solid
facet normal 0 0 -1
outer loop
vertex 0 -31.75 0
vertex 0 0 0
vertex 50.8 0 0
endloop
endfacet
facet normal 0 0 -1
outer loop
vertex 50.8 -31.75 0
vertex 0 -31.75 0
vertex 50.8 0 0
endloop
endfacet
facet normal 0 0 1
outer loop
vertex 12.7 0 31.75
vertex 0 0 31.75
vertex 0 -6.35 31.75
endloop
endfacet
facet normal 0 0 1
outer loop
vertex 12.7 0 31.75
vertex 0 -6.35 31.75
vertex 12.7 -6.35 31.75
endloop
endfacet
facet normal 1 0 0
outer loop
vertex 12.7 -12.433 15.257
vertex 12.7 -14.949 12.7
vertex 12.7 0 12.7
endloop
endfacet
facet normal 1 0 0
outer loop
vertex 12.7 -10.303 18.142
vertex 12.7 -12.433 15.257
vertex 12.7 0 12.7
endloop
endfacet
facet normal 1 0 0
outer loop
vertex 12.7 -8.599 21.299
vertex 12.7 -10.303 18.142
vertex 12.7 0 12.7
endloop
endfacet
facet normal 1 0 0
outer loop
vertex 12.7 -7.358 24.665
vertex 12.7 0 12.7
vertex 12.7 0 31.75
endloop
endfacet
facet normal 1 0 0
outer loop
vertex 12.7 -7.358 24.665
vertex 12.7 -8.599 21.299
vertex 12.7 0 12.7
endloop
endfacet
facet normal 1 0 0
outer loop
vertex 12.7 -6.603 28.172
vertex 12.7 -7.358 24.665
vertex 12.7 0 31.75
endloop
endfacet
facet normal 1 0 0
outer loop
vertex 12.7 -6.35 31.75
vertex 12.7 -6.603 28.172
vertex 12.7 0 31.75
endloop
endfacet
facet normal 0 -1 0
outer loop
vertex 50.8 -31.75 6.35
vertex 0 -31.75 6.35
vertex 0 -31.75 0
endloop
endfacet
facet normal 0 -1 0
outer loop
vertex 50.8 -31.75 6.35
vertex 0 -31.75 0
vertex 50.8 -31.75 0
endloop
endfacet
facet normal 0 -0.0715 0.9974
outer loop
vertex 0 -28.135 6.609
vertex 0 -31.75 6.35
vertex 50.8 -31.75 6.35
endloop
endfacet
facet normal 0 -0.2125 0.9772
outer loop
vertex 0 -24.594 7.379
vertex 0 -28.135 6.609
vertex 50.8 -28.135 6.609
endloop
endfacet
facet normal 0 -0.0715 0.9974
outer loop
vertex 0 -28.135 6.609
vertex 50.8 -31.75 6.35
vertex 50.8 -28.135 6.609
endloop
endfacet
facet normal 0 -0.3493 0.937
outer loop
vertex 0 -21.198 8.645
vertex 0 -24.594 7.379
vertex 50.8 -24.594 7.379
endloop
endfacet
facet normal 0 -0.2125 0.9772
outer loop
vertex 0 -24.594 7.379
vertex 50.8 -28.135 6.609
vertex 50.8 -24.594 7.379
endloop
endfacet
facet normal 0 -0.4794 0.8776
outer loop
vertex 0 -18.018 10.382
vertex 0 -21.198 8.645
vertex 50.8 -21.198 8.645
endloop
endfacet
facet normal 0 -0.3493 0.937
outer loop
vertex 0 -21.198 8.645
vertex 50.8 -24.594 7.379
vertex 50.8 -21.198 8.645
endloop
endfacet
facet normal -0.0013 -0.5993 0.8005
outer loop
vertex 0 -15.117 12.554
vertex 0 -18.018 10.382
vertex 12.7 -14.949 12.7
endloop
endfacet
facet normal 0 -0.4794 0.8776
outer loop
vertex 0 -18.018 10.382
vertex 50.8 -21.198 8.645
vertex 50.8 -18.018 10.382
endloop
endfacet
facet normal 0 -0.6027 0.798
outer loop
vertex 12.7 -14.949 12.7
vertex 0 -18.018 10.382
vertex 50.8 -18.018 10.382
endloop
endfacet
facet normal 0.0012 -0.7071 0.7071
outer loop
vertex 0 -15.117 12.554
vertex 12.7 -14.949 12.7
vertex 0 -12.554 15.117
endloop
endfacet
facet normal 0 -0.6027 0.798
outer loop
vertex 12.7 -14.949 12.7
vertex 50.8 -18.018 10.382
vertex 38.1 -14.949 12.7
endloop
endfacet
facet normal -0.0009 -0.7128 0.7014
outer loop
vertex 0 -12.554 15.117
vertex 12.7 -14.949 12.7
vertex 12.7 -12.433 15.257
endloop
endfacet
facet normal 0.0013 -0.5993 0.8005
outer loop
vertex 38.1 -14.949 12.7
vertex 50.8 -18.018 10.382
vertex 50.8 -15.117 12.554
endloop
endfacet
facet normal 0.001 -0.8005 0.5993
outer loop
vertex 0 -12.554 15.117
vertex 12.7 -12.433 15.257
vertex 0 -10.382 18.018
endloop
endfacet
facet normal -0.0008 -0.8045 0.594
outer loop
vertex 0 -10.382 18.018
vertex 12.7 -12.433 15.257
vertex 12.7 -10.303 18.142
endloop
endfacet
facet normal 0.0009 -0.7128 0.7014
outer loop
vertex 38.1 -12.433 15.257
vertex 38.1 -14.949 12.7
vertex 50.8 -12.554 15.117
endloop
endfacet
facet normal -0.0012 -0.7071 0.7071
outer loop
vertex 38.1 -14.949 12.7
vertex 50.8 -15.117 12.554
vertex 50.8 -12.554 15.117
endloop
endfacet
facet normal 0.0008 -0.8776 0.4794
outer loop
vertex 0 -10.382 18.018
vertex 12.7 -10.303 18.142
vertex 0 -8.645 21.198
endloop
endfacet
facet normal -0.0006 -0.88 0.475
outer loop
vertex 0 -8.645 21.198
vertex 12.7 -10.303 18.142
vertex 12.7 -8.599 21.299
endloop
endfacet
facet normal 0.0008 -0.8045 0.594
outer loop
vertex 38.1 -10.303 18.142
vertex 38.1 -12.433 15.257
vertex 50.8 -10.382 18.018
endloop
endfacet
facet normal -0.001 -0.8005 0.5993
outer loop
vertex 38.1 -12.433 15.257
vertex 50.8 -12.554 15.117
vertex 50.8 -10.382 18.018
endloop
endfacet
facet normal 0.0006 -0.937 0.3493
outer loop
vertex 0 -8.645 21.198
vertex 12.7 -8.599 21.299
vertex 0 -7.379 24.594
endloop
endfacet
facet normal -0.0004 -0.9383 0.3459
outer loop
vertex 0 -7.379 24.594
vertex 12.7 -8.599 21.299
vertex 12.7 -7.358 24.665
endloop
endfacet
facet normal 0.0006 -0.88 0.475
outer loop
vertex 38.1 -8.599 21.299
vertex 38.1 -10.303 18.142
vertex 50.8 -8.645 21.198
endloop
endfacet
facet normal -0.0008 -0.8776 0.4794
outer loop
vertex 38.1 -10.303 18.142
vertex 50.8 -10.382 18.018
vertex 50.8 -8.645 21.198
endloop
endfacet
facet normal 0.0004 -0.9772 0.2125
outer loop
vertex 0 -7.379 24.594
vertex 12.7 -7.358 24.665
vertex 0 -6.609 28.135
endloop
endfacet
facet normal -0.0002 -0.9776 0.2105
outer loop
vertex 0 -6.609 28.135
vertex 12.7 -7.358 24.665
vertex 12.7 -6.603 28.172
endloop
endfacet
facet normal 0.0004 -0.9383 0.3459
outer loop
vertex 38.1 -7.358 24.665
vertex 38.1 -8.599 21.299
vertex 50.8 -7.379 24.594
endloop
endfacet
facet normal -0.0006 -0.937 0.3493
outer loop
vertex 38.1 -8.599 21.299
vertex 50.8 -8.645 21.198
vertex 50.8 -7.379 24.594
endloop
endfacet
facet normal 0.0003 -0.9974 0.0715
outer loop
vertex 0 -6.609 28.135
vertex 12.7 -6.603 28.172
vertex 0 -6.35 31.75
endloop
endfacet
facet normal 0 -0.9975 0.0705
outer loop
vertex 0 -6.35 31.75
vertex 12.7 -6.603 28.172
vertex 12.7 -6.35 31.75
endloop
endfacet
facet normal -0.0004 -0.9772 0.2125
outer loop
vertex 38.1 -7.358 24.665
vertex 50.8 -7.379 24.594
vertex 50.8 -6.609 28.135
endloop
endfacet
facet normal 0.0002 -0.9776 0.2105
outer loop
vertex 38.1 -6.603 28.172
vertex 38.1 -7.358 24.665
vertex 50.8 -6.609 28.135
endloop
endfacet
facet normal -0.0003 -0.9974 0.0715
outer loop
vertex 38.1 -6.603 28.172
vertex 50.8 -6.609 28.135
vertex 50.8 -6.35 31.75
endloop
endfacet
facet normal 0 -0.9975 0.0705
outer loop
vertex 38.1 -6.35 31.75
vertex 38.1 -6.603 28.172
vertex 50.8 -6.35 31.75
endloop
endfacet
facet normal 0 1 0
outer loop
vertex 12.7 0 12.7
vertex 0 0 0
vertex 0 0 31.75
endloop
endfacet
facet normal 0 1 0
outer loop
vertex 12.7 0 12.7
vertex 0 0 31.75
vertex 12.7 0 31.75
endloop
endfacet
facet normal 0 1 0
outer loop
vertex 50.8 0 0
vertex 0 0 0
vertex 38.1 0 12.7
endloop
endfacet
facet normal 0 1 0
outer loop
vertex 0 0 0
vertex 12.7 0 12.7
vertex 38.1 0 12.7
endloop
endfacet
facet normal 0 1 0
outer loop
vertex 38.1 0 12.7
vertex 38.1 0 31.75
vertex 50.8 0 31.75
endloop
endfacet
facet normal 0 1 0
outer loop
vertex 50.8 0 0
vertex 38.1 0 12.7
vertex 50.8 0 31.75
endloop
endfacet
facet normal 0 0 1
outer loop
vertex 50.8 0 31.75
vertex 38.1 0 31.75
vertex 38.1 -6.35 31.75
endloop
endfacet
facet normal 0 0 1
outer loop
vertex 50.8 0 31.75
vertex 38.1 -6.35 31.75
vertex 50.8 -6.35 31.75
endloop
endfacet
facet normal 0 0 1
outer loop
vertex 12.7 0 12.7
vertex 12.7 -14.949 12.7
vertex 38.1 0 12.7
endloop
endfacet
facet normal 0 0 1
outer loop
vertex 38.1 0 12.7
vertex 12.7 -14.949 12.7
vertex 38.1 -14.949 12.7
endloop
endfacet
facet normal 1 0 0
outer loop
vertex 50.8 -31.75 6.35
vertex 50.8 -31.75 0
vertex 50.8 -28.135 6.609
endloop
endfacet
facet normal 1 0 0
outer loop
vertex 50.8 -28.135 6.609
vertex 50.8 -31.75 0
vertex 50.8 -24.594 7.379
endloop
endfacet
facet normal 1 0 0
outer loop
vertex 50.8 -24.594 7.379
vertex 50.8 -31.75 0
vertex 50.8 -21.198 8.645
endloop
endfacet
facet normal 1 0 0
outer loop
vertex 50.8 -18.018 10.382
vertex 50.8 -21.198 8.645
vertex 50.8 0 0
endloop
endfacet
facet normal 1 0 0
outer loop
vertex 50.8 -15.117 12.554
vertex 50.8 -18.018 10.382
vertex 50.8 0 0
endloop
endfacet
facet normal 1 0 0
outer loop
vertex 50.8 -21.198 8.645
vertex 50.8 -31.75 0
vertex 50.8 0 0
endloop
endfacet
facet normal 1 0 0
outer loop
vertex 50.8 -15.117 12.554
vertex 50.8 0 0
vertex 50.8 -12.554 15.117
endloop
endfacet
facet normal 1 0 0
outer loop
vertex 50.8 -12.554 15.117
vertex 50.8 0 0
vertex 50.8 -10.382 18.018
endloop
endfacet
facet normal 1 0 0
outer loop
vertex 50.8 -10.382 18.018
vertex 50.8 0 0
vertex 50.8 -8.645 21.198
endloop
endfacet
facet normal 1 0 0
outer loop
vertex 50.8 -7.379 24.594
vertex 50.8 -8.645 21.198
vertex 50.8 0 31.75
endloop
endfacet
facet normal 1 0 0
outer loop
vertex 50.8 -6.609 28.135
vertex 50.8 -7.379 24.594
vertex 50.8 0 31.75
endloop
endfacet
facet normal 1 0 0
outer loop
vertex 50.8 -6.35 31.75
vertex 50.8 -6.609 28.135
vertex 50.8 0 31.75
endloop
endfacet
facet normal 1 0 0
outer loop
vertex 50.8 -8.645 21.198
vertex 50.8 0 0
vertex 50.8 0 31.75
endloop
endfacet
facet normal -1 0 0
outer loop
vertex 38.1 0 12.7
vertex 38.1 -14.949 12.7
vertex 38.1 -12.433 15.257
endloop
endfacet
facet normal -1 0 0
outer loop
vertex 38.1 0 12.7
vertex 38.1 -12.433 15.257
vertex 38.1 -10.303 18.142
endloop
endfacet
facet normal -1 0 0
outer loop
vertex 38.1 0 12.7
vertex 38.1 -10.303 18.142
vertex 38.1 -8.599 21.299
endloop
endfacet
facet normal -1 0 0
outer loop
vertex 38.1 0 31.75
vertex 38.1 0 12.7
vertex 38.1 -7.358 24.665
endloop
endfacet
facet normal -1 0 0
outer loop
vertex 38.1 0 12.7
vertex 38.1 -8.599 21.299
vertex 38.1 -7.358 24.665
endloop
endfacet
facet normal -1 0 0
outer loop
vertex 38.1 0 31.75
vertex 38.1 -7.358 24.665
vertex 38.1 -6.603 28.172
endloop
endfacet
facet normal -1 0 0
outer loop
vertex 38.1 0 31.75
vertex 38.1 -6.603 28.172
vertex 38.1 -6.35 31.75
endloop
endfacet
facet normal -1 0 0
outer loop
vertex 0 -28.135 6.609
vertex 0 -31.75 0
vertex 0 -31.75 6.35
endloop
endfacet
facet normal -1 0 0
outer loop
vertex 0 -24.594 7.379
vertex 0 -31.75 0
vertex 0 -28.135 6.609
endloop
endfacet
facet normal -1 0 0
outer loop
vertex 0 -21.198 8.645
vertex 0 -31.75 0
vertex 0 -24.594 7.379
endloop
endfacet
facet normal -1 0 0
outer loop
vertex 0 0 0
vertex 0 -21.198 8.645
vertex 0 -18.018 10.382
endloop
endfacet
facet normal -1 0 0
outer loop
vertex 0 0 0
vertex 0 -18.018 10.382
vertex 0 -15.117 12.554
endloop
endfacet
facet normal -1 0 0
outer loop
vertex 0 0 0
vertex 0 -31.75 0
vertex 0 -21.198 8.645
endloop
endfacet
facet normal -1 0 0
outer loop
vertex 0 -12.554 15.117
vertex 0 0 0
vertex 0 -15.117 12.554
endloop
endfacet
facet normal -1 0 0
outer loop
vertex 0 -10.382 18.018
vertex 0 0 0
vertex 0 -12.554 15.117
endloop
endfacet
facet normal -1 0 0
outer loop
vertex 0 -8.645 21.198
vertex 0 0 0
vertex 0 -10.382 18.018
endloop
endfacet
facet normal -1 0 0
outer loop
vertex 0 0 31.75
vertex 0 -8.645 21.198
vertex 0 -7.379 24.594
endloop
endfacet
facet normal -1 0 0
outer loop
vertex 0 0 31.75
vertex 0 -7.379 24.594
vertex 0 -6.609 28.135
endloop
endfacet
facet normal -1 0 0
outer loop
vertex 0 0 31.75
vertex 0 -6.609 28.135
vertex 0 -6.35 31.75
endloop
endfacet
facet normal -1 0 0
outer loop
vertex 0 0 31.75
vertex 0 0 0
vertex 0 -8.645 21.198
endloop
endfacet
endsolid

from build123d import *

# Parameters (mm, degrees)
F0_W     = 50.8
F0_H     = 31.75
F1_DEPTH = 31.75
F2_W     = 25.4
F2_H     = 19.05
F3_DEPTH = 31.751
F4_R     = 25.4
F5_DEPTH = 50.801


with BuildPart() as f1:
    # F0 (on Front) → F1 (new body)
    with BuildSketch(Plane.XZ):
        with Locations((25.4, 15.875)):
            Rectangle(F0_W, F0_H)
    extrude(amount=F1_DEPTH)

    # F2 (on face) → F3 (cut, through all)
    with BuildSketch(Plane.XZ.offset(31.75)):
        with Locations((25.4, 22.225)):
            Rectangle(F2_W, F2_H)
    extrude(amount=-F3_DEPTH, mode=Mode.SUBTRACT)

    # F4 (on face) → F5 (cut, through all)
    with BuildSketch(Plane.YZ.offset(50.8)):
        with Locations((-31.75, 31.75)):
            Circle(F4_R)
    extrude(amount=-F5_DEPTH, mode=Mode.SUBTRACT)


solid = f1.part
